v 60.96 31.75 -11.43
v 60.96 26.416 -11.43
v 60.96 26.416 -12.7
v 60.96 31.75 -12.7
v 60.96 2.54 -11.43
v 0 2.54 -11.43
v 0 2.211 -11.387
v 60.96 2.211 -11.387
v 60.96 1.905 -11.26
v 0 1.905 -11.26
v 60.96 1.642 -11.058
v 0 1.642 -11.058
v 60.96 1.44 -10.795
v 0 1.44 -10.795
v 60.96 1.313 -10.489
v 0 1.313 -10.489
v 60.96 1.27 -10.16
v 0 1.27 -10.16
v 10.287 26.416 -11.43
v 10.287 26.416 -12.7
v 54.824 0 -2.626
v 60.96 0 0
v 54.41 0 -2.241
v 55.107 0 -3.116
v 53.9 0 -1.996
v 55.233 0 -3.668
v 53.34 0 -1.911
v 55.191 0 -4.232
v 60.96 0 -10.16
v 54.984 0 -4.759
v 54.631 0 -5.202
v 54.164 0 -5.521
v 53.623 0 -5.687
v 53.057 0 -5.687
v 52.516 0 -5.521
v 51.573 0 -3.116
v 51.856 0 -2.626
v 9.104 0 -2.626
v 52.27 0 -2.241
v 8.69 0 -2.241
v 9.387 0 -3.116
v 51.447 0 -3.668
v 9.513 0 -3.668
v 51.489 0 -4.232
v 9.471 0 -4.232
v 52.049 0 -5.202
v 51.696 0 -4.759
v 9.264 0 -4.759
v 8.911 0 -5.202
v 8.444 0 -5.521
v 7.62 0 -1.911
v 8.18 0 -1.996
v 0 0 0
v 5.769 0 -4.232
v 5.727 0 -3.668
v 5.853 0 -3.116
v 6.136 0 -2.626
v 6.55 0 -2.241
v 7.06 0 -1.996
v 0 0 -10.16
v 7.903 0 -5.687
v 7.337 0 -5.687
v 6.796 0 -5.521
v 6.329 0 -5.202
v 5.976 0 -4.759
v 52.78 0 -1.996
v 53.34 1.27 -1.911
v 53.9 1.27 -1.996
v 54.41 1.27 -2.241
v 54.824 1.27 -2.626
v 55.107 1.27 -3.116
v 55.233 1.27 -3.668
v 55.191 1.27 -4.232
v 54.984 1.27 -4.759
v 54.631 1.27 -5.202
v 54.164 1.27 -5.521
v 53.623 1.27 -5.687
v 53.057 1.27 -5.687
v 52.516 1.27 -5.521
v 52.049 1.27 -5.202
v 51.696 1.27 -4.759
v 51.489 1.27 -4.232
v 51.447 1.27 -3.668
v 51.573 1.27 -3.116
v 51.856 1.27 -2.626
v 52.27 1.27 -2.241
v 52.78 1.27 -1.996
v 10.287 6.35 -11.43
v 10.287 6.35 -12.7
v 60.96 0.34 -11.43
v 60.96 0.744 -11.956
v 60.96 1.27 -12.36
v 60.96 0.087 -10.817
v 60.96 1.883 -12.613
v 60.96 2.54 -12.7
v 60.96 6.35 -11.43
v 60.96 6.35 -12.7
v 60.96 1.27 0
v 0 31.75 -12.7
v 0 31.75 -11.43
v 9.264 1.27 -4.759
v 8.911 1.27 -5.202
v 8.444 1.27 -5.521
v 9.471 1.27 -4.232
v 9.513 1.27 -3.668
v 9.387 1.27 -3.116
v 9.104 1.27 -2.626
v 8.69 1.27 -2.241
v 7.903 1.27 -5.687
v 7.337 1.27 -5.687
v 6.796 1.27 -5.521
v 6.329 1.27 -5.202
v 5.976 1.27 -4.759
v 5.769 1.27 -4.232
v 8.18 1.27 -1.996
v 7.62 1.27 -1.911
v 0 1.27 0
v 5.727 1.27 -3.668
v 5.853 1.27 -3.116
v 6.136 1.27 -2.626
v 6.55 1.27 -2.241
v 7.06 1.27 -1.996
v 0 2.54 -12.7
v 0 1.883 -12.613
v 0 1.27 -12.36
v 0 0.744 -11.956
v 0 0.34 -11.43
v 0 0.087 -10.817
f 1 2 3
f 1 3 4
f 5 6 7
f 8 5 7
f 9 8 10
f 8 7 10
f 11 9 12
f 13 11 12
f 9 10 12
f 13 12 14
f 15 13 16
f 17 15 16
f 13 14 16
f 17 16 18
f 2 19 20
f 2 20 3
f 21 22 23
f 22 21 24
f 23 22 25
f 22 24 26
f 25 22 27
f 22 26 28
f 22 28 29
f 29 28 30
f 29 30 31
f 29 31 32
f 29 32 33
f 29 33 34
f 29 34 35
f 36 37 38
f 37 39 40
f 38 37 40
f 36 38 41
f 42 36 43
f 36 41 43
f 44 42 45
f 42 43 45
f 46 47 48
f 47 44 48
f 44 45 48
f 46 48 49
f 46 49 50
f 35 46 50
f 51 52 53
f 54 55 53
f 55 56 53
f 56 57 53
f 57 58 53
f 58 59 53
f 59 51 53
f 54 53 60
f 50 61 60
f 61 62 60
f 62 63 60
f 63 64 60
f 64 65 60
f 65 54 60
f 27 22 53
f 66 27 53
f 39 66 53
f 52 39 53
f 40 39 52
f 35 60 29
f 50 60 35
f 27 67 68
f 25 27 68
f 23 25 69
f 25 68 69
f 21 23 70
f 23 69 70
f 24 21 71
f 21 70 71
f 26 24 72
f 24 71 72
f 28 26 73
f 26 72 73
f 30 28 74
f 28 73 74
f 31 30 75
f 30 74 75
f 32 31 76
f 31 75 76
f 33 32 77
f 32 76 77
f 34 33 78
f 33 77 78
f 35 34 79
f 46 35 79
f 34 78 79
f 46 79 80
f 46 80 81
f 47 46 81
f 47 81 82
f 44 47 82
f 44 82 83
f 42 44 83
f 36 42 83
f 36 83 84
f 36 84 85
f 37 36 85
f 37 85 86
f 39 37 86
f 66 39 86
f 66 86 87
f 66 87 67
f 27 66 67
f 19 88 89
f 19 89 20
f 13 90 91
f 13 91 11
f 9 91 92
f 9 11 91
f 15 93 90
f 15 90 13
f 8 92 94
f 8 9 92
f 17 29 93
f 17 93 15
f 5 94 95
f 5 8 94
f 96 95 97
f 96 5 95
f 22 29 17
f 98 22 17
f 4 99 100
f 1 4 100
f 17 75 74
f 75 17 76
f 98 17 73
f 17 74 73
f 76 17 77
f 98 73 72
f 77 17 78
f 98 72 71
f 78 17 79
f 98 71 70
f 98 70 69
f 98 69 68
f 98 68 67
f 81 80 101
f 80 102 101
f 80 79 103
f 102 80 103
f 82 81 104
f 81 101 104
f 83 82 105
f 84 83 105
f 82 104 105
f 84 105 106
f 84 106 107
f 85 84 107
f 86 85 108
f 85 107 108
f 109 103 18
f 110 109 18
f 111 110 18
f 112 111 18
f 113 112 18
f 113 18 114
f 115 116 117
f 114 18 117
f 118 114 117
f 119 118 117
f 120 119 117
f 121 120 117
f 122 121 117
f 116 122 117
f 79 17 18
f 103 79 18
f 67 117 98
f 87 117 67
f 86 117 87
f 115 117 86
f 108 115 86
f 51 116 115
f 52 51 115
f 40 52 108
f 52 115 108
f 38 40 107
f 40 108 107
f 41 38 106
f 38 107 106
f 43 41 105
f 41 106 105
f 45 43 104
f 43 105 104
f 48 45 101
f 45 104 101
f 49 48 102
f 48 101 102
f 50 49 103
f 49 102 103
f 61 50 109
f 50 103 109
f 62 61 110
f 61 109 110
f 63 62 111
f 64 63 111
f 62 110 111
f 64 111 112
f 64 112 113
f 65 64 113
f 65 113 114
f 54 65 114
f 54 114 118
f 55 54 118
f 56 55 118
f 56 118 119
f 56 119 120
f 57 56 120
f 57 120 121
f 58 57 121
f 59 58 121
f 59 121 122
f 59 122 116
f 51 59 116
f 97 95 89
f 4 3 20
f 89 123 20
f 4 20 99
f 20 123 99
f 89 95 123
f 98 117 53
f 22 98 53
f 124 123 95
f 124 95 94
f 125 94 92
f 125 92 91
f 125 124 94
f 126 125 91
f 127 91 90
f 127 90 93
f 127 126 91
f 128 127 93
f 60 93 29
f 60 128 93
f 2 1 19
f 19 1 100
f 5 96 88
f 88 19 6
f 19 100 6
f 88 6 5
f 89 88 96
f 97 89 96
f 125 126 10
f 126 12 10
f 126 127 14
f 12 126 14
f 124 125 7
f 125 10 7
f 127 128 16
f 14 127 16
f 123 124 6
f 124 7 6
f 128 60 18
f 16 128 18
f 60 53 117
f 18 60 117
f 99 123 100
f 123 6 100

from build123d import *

# Parameters (mm, degrees)
BOSS_EXTRUDE1_DEPTH    = 60.96
CONVERT_SOLID1_DEPTH   = 60.96
CONVERT_SOLID1_2_DEPTH = 60.96
SKETCH6_W              = 40.386
SKETCH6_H              = 20.066
CUT_EXTRUDE1_DEPTH     = 70.67660296
SKETCH8_R              = 1.89865
CUT_EXTRUDE2_DEPTH     = 70.328507845
SKETCH11_W             = 18.1335173
SKETCH11_H             = 20.066
CUT_EXTRUDE5_DEPTH     = 70.67660296


# Read off the part's stored shape, not the designer's step: Convert-Solid1
with BuildPart() as part:
    # Sketch1 → Boss-Extrude1 (new body)
    with BuildSketch(Plane(origin=(0, 0, 0), x_dir=(0, 0, -1), z_dir=(1, 0, 0))):
        Polygon((0, 0), (12.7, 0), (12.7, 31.75), (11.43, 31.75), (11.43, 1.27), (0, 1.27), align=None)
    extrude(amount=BOSS_EXTRUDE1_DEPTH)

    # Convert-Solid1 outline → Convert-Solid1 (cut)
    with BuildSketch(Plane.YZ):
        with BuildLine():
            ThreePointArc((2.54, -12.7), (0.743948776, -11.956051224), (0, -10.16))
            Line((0, -10.16), (0, -12.7))
            Line((0, -12.7), (2.54, -12.7))
        make_face()
    extrude(amount=CONVERT_SOLID1_DEPTH, mode=Mode.SUBTRACT)

    # Convert-Solid1 2 outline → Convert-Solid1 2 (add)
    with BuildSketch(Plane.YZ):
        with BuildLine():
            ThreePointArc((2.54, -11.43), (1.641974388, -11.058025612), (1.27, -10.16))
            Line((1.27, -10.16), (1.27, -11.43))
            Line((1.27, -11.43), (2.54, -11.43))
        make_face()
    extrude(amount=CONVERT_SOLID1_2_DEPTH)

    # Sketch6 → Cut-Extrude1 (cut, through all)
    with BuildSketch(Plane.XY.offset(-11.43)):
        with Locations((30.48, 16.383)):
            Rectangle(SKETCH6_W, SKETCH6_H)
    extrude(amount=-CUT_EXTRUDE1_DEPTH, mode=Mode.SUBTRACT)

    # Sketch8 → Cut-Extrude2 (cut, through all)
    with BuildSketch(Plane(origin=(0, 1.27, 0), x_dir=(1, 0, 0), z_dir=(0, 1, 0))):
        with Locations(Location((7.62, 3.81, 0), (0, 0, 270))):
            Circle(SKETCH8_R)
        with Locations(Location((53.34, 3.81, 0), (0, 0, 270))):
            Circle(SKETCH8_R)
    extrude(amount=-CUT_EXTRUDE2_DEPTH, mode=Mode.SUBTRACT)

    # Sketch11 → Cut-Extrude5 (cut, through all)
    with BuildSketch(Plane.XY.offset(-11.43)):
        with Locations((59.73975865, 16.383)):
            Rectangle(SKETCH11_W, SKETCH11_H)
    extrude(amount=-CUT_EXTRUDE5_DEPTH, mode=Mode.SUBTRACT)


solid = part.part
